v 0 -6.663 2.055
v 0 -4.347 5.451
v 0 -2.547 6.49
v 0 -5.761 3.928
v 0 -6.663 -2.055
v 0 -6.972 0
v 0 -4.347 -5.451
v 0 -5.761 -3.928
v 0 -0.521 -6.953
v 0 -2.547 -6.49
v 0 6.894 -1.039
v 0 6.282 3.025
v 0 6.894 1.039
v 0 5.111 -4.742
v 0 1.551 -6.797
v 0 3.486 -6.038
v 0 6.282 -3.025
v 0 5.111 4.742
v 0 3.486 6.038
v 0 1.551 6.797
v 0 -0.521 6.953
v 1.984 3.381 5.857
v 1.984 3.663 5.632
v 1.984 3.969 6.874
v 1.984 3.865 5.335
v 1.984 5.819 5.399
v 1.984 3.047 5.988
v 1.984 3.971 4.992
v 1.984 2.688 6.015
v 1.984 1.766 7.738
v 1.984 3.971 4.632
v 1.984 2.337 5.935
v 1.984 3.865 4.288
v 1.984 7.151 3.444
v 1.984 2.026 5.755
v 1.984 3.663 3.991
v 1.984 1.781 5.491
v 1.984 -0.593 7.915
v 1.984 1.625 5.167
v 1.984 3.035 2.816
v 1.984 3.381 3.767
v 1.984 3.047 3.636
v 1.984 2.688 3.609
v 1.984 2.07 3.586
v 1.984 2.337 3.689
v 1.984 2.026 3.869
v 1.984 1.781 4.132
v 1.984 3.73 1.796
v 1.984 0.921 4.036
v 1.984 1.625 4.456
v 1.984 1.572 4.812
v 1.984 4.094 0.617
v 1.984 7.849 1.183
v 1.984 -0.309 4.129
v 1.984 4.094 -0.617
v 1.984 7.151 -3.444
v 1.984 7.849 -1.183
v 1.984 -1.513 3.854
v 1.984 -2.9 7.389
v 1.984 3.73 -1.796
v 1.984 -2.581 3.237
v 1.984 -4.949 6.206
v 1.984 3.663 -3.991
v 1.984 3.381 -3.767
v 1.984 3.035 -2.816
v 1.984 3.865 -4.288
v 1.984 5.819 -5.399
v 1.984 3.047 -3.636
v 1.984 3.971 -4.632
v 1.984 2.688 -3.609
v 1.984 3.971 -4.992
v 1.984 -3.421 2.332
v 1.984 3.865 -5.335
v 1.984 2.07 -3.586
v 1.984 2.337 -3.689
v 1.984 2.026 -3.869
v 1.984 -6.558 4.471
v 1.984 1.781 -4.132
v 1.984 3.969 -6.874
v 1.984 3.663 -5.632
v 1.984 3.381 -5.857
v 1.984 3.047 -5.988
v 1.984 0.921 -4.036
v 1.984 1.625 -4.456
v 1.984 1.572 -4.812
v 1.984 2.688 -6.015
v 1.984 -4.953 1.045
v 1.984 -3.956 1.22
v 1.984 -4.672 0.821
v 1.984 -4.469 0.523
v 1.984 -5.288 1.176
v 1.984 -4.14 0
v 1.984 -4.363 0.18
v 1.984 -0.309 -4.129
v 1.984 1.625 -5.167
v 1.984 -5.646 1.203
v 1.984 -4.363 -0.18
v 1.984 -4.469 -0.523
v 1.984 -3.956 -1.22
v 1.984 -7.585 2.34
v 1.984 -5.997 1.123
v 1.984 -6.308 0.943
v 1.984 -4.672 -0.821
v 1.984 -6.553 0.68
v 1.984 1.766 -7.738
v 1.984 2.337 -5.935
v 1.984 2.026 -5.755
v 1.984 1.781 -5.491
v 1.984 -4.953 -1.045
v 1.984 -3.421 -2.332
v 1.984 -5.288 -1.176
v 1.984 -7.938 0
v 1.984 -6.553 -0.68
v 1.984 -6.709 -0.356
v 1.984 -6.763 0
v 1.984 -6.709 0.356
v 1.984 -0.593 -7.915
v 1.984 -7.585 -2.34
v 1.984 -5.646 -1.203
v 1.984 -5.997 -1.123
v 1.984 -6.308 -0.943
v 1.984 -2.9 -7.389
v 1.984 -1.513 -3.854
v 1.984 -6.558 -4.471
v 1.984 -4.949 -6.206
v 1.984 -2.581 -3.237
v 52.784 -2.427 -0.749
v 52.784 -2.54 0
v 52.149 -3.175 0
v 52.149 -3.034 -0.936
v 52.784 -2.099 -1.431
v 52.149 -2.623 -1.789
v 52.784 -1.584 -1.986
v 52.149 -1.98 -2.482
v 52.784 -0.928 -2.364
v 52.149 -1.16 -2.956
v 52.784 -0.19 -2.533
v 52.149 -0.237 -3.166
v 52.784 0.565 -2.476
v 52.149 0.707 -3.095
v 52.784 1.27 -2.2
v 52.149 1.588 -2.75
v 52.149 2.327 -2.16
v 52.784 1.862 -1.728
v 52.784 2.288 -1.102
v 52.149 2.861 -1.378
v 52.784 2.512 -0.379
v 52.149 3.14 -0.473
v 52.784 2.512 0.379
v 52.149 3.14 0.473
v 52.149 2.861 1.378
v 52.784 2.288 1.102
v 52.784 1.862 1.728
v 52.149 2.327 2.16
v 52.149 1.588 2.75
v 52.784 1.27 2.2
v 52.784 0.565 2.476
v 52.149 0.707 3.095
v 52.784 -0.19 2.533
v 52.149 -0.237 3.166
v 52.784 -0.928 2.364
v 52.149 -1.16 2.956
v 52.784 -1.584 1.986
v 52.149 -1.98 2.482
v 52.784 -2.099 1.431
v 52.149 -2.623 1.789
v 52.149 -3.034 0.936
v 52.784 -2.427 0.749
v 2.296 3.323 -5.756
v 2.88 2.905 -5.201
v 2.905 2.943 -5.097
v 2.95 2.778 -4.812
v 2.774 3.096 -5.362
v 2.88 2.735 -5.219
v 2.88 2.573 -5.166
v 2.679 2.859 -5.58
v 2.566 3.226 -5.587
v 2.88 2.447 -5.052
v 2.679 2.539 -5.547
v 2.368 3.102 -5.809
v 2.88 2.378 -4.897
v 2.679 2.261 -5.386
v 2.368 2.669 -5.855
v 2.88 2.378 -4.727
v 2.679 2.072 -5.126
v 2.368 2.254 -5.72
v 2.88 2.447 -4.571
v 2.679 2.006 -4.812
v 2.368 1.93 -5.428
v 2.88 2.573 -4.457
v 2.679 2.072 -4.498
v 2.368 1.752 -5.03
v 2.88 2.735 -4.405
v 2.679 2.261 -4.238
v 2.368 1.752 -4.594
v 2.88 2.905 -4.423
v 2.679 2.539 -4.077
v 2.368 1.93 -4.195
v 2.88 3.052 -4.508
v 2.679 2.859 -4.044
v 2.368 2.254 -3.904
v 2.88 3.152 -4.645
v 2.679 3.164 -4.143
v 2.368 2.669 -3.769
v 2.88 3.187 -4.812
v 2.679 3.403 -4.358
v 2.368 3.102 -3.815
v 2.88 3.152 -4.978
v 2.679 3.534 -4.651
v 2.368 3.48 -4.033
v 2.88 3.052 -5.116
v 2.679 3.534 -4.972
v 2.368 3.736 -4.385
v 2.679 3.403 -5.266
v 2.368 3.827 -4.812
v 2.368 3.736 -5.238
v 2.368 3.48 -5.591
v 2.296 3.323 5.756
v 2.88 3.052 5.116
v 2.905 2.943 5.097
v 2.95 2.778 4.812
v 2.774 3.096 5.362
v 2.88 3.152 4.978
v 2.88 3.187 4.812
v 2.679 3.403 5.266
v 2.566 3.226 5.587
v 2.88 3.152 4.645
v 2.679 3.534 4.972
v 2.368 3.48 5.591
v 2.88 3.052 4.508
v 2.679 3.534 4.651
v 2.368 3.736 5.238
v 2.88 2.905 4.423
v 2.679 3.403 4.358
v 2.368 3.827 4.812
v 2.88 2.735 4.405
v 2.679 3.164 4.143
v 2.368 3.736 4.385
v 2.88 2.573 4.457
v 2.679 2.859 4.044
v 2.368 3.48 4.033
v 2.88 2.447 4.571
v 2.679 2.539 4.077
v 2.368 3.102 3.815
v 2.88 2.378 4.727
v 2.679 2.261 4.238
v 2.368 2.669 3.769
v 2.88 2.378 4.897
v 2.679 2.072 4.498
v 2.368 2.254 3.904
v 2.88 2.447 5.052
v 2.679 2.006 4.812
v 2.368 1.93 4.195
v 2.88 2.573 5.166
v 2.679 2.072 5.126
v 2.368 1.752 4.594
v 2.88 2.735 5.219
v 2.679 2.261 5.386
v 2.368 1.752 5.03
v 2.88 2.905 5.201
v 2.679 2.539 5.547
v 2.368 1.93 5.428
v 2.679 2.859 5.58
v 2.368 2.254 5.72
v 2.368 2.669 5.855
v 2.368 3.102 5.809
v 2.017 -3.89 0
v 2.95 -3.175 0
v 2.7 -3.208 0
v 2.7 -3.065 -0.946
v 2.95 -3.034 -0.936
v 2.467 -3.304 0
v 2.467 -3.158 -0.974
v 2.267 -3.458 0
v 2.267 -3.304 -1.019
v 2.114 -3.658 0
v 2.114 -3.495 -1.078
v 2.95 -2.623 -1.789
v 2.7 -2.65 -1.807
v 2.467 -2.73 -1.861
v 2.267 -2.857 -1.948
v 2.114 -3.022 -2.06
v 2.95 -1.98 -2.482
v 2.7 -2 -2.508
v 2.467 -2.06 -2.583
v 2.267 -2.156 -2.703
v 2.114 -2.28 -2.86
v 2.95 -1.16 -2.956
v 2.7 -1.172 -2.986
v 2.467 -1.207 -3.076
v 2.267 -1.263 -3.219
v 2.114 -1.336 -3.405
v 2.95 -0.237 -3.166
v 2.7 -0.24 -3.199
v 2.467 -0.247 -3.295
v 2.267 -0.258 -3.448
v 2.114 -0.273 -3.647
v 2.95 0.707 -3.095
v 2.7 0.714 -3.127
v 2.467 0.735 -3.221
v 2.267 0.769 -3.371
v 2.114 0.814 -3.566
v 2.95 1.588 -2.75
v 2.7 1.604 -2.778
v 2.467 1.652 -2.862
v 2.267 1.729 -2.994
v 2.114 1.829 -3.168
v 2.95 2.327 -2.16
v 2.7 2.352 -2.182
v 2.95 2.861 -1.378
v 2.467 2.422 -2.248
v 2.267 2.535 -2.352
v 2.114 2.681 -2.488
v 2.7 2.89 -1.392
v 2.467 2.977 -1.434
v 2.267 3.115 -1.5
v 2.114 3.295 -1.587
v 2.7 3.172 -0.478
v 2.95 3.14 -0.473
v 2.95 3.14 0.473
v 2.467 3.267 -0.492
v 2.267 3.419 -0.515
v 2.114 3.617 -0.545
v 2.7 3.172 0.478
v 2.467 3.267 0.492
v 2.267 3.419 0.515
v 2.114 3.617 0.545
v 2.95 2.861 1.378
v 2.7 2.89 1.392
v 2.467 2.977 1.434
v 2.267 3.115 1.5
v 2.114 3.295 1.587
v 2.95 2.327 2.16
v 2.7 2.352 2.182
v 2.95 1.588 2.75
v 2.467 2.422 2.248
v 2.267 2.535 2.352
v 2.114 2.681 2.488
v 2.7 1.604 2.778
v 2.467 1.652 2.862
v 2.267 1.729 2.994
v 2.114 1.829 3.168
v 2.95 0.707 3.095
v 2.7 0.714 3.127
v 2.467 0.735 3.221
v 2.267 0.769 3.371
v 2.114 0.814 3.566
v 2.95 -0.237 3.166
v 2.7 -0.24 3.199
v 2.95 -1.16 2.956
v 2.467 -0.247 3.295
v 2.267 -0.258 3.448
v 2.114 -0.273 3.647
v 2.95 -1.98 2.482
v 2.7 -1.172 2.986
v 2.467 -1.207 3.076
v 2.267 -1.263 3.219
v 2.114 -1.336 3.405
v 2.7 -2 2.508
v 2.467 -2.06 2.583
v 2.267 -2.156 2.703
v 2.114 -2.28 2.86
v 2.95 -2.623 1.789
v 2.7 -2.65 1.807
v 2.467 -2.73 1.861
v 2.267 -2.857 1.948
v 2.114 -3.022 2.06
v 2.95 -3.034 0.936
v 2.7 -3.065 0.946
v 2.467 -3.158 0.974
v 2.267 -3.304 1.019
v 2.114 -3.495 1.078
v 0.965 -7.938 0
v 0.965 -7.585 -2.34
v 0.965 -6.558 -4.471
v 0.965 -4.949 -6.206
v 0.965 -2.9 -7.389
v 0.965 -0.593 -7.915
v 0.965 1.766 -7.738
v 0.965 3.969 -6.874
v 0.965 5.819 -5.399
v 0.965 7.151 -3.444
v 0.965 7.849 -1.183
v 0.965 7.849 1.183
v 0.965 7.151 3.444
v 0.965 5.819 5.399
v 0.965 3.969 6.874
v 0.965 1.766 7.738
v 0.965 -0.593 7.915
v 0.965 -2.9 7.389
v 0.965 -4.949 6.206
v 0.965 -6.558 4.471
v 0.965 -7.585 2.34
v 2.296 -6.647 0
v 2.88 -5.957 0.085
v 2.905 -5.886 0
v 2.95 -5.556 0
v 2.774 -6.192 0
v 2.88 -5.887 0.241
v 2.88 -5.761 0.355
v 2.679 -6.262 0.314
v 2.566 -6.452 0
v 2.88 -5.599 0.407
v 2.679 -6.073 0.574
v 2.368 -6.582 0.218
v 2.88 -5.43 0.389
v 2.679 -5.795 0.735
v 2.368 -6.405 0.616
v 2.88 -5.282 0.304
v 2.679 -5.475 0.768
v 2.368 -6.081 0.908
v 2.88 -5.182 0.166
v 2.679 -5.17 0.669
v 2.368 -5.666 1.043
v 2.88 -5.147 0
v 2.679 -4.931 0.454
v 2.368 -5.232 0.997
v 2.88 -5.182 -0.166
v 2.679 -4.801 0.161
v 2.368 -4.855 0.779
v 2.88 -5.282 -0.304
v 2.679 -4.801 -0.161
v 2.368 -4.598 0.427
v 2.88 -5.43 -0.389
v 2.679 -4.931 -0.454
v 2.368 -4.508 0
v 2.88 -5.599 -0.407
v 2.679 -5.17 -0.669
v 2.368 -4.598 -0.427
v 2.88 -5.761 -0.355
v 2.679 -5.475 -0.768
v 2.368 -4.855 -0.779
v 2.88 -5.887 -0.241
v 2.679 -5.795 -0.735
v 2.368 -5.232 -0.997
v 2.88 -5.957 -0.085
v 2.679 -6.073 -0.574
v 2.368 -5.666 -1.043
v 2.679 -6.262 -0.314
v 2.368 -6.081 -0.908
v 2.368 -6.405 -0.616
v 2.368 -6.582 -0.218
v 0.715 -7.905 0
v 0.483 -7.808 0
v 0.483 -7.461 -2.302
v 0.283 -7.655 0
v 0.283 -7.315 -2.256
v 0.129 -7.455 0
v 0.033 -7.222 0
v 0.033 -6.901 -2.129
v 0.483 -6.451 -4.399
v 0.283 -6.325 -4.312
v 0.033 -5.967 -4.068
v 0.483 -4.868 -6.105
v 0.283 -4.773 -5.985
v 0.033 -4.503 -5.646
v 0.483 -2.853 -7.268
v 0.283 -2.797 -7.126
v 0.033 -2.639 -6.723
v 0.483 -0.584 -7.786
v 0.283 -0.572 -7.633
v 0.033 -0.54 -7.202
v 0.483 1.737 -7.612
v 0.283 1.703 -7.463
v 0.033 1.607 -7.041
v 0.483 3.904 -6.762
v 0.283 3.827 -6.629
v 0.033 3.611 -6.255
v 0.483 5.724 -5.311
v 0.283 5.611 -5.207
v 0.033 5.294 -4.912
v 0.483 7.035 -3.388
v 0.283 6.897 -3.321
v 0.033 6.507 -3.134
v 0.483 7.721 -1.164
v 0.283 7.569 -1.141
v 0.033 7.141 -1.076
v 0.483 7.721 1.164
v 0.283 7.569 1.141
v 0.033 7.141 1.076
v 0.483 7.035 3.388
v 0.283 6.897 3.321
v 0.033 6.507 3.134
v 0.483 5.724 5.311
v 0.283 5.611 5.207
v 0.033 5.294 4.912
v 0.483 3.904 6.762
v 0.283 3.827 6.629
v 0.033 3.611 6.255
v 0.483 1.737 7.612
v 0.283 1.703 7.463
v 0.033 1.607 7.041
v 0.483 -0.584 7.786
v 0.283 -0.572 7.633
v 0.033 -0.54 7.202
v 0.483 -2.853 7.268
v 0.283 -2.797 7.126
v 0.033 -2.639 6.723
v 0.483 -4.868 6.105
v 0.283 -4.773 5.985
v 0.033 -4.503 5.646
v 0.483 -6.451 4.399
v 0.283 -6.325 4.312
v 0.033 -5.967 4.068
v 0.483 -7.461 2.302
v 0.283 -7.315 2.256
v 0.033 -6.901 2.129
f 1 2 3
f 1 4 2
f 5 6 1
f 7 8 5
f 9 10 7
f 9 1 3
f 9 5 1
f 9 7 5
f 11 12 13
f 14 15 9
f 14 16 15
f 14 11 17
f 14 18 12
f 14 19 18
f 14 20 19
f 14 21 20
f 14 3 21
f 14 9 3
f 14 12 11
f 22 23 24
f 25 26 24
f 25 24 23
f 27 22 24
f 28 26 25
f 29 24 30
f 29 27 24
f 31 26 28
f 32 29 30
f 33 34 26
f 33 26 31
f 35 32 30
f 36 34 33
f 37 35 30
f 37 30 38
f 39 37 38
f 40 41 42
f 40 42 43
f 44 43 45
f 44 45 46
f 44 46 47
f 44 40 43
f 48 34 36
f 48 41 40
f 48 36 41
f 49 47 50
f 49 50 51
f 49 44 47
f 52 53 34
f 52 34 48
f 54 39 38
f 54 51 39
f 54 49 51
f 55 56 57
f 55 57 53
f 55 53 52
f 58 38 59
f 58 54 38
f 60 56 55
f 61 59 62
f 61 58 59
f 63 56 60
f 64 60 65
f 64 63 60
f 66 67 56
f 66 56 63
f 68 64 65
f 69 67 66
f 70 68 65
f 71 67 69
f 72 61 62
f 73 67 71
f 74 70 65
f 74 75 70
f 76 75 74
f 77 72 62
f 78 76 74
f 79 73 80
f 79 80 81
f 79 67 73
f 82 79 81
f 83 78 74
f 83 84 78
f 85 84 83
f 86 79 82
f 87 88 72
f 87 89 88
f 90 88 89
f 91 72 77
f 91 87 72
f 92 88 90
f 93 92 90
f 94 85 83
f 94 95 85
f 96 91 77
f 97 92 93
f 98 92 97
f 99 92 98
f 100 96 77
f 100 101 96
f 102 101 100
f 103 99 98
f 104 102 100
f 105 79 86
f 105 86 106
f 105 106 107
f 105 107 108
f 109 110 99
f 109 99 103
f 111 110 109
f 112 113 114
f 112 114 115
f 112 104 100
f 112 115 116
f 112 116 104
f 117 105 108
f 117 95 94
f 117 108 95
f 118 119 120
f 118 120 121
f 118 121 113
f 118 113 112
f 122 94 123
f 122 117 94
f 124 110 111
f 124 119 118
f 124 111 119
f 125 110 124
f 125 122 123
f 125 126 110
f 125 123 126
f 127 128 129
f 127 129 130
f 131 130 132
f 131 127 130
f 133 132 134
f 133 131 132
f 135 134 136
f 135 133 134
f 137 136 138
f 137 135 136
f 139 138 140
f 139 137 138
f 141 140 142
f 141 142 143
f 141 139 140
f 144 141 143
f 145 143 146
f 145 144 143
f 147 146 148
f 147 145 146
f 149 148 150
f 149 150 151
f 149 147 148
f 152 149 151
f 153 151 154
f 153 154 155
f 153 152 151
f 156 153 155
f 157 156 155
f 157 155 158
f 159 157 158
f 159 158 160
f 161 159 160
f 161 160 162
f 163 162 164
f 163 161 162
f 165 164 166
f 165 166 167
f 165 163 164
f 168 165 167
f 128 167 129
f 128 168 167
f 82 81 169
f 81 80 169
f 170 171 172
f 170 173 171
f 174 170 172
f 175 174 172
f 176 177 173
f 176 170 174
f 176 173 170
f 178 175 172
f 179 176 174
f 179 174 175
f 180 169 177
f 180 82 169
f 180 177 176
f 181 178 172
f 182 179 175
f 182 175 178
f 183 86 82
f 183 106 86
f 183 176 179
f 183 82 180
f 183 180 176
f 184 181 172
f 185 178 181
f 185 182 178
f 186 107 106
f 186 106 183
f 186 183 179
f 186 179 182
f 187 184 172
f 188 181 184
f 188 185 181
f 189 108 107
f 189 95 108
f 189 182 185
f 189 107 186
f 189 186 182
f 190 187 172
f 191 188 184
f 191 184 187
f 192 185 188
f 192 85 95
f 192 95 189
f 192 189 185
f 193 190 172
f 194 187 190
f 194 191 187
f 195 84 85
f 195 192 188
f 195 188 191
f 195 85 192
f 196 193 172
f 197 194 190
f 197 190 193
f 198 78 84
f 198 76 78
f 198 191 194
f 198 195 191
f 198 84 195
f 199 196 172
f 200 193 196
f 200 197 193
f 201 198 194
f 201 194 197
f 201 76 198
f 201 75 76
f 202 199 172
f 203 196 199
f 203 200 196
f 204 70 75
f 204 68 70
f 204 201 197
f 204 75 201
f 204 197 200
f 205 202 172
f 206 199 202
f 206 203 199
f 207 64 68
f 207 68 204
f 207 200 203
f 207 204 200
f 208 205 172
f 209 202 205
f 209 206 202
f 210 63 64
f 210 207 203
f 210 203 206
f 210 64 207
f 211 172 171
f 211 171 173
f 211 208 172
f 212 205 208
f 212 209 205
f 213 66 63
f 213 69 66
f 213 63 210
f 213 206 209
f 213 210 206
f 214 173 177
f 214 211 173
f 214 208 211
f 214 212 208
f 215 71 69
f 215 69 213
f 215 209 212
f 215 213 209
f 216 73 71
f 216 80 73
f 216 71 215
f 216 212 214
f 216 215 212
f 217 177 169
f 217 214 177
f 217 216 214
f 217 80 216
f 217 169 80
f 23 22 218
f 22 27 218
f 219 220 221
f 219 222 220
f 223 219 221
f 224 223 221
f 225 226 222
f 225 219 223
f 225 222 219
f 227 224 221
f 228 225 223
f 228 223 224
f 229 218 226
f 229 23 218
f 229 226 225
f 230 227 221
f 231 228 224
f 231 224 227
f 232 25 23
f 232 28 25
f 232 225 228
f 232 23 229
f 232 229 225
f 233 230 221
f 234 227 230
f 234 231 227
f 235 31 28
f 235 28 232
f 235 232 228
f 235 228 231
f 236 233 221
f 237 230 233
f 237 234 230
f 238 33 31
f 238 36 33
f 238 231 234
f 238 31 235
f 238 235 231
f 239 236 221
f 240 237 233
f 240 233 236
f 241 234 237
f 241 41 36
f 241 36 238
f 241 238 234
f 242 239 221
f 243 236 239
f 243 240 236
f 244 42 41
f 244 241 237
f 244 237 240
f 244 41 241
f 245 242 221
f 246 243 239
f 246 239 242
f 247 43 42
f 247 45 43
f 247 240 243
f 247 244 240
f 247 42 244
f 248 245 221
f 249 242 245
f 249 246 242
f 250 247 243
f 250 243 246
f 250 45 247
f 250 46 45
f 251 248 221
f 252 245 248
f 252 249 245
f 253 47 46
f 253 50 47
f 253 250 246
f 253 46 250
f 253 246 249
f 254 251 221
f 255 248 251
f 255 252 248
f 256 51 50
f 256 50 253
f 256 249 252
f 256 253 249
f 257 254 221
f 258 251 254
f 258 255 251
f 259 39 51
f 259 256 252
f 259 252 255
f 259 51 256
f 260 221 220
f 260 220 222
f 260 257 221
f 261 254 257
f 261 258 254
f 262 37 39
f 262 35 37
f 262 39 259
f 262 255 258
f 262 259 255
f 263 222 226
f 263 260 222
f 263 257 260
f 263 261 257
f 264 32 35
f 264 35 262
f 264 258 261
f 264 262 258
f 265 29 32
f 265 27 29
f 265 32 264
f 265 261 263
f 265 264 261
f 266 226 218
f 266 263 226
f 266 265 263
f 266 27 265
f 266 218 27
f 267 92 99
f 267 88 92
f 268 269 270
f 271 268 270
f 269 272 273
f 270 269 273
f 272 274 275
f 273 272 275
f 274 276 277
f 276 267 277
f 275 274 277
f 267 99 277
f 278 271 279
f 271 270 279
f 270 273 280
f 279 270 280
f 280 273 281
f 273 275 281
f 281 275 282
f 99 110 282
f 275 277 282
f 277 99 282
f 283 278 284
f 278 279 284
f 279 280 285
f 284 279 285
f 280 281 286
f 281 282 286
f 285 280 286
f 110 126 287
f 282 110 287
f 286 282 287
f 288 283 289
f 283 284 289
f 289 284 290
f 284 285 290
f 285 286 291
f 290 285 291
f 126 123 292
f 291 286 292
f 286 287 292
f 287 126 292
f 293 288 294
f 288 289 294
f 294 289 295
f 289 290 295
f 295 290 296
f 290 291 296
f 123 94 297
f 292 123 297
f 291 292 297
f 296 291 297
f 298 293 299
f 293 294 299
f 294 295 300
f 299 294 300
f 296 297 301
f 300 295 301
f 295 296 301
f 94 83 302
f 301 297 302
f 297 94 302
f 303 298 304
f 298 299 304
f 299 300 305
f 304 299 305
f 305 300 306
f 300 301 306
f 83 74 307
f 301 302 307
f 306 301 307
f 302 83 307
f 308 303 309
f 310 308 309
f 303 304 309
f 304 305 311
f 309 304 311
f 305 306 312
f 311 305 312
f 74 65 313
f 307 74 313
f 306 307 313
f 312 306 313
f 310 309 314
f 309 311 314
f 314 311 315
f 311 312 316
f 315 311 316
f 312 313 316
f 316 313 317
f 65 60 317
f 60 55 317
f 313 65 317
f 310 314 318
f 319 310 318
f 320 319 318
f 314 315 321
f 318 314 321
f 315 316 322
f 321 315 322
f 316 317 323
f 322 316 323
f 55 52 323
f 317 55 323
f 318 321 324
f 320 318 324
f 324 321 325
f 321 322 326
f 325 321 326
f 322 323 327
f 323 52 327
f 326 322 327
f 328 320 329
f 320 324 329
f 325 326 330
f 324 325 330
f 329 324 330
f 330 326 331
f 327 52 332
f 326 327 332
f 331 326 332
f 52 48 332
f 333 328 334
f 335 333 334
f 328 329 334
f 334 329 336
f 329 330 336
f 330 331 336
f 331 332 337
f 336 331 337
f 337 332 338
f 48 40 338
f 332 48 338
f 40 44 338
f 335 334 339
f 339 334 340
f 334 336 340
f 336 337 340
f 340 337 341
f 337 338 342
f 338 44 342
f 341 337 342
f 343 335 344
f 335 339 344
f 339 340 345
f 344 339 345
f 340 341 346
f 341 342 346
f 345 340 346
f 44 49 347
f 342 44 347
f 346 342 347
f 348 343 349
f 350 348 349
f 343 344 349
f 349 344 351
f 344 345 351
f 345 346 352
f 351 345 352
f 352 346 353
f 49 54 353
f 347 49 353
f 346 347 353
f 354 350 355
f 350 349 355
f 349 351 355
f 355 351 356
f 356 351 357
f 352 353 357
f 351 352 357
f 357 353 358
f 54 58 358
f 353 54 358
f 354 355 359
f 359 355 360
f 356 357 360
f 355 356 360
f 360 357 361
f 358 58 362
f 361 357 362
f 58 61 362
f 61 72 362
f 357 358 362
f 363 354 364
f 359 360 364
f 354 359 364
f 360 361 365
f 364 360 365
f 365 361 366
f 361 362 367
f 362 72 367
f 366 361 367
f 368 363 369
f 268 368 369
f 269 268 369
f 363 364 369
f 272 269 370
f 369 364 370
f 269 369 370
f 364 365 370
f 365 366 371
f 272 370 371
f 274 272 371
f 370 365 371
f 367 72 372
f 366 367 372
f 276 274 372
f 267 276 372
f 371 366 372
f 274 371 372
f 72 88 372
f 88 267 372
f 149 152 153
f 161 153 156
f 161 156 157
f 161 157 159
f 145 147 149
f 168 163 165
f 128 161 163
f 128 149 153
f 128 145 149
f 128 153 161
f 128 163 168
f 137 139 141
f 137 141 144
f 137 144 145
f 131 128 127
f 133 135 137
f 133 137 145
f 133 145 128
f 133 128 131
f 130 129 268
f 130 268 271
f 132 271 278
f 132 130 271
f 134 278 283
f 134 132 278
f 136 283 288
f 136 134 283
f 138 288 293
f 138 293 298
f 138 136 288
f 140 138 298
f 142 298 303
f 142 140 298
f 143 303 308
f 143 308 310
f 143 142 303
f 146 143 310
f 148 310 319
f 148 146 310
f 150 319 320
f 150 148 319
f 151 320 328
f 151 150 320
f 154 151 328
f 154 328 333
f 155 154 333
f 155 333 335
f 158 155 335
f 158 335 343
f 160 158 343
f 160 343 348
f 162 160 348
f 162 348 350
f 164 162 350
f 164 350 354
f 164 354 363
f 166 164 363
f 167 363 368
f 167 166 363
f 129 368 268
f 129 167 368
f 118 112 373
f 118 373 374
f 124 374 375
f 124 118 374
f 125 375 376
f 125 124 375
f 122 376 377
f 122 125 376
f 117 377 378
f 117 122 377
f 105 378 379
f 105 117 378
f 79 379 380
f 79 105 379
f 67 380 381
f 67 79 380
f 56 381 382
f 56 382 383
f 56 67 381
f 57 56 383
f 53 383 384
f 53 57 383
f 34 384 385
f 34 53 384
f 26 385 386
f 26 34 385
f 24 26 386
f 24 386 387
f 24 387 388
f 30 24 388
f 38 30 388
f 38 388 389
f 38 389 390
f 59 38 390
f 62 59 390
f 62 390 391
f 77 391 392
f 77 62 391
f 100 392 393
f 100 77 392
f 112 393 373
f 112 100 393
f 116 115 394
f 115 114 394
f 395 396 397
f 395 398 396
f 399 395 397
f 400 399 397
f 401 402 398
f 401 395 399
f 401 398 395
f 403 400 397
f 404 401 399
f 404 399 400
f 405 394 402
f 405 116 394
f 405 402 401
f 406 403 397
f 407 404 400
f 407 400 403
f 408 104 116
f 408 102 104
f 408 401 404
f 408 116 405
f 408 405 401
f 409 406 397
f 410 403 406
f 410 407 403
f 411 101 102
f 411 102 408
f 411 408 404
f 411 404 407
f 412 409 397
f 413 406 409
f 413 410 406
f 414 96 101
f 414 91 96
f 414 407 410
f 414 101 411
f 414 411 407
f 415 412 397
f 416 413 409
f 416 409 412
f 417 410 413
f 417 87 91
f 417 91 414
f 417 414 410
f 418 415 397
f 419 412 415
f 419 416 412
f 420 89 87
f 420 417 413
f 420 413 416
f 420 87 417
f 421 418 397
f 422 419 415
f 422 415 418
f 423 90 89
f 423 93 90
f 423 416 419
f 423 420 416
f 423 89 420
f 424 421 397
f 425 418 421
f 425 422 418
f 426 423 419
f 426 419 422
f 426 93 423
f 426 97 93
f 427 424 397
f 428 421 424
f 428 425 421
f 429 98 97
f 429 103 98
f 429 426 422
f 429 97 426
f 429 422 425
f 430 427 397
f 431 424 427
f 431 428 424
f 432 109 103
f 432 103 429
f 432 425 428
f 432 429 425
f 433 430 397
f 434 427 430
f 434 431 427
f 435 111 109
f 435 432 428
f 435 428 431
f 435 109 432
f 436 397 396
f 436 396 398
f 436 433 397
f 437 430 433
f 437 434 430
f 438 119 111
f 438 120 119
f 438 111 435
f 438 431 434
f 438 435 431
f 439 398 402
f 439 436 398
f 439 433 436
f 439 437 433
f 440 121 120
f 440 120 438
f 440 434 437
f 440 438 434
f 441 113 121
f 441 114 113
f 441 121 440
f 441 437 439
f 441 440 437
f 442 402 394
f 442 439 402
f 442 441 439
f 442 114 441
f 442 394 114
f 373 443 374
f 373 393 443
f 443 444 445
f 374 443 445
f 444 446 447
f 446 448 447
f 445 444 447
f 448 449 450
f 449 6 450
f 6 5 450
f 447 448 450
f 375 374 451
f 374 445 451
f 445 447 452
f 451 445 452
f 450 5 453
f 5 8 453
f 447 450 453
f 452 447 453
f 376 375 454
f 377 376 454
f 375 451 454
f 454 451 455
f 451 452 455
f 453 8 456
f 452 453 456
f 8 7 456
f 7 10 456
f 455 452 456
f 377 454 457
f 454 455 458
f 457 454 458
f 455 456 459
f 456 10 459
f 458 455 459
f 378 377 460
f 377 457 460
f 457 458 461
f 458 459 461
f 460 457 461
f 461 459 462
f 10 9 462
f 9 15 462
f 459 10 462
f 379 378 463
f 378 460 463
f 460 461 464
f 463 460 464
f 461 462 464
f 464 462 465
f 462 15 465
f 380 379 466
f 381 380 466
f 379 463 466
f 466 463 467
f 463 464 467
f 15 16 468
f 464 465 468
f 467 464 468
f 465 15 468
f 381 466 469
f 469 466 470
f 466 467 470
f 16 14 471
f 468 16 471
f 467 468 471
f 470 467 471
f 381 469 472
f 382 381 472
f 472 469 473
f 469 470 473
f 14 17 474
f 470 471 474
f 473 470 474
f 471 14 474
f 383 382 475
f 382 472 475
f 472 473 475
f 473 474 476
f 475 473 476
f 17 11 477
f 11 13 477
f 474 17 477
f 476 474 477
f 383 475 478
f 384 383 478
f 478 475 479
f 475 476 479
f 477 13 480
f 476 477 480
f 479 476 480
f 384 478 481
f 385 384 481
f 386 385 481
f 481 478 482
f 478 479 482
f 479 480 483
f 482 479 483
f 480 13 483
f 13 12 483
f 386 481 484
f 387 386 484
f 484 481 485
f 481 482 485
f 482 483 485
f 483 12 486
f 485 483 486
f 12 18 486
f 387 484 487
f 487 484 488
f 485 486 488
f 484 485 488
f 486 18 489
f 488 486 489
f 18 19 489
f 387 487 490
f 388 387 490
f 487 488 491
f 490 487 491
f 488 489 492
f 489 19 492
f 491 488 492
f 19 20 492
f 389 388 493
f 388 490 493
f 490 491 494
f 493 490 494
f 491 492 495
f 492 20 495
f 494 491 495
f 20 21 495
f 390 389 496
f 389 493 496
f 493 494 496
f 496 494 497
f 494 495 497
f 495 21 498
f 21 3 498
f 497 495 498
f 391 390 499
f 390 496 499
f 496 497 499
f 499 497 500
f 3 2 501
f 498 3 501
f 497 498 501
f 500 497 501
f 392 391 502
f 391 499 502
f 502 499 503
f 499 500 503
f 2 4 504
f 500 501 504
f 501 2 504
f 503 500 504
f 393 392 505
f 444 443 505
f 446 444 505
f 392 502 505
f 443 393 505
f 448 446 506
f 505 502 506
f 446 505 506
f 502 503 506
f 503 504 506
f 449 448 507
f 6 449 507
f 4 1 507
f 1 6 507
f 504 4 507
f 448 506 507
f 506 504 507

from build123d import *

# Parameters (mm, degrees)
CHAMFER1_SIZE     = 0.635
CIRPATTERN1_COUNT = 3
FILLET1_R         = 0.9652


with BuildPart() as part:
    # Sketch1 → Revolve1 (revolve)
    with BuildSketch(Plane.XY, mode=Mode.PRIVATE) as revolve1_sk:
        Polygon((0, 0), (0, 7.9375), (1.984375, 7.9375), (1.984375, 3.175), (52.784375, 3.175), (52.784375, 0), align=None)
    revolve(revolve1_sk.sketch.rotate(Axis((0, 0, 0), (1, 0, 0)), 180), axis=Axis((0, 0, 0), (1, 0, 0)))

    # Chamfer1
    chamfer1_edges = [part.edges().sort_by_distance(p)[0] for p in [
        (52.784375, 3.175, 0),
    ]]
    chamfer(chamfer1_edges, length=CHAMFER1_SIZE)

    # Sketch2 → Revolve2 (revolve)
    with BuildSketch(Plane.XY, mode=Mode.PRIVATE) as revolve2_sk:
        with BuildLine():
            Line((1.984375, -5.55625), (2.949575, -5.55625))
            ThreePointArc((2.949575, -5.55625), (2.678583674, -4.783713061), (1.984375, -4.34975))
            Line((1.984375, -4.34975), (1.984375, -5.55625))
        make_face()
    revolve2 = revolve(revolve2_sk.sketch.rotate(Axis((1.984375, -5.55625, 0), (-1, 0, 0)), 180), axis=Axis((1.984375, -5.55625, 0), (-1, 0, 0)))

    # CirPattern1: Revolve2 ×3 about axis
    cirpattern1_axis = Axis((0, 0, 0), (1, 0, 0))
    for i in range(1, CIRPATTERN1_COUNT):
        add(revolve2.rotate(cirpattern1_axis, i * 360 / CIRPATTERN1_COUNT))

    # Fillet1
    fillet1_edges = [part.edges().sort_by_distance(p)[0] for p in [
        (1.984375, 3.175, 0),
        (0, 7.9375, 0),
    ]]
    fillet(fillet1_edges, radius=FILLET1_R)


solid = part.part
